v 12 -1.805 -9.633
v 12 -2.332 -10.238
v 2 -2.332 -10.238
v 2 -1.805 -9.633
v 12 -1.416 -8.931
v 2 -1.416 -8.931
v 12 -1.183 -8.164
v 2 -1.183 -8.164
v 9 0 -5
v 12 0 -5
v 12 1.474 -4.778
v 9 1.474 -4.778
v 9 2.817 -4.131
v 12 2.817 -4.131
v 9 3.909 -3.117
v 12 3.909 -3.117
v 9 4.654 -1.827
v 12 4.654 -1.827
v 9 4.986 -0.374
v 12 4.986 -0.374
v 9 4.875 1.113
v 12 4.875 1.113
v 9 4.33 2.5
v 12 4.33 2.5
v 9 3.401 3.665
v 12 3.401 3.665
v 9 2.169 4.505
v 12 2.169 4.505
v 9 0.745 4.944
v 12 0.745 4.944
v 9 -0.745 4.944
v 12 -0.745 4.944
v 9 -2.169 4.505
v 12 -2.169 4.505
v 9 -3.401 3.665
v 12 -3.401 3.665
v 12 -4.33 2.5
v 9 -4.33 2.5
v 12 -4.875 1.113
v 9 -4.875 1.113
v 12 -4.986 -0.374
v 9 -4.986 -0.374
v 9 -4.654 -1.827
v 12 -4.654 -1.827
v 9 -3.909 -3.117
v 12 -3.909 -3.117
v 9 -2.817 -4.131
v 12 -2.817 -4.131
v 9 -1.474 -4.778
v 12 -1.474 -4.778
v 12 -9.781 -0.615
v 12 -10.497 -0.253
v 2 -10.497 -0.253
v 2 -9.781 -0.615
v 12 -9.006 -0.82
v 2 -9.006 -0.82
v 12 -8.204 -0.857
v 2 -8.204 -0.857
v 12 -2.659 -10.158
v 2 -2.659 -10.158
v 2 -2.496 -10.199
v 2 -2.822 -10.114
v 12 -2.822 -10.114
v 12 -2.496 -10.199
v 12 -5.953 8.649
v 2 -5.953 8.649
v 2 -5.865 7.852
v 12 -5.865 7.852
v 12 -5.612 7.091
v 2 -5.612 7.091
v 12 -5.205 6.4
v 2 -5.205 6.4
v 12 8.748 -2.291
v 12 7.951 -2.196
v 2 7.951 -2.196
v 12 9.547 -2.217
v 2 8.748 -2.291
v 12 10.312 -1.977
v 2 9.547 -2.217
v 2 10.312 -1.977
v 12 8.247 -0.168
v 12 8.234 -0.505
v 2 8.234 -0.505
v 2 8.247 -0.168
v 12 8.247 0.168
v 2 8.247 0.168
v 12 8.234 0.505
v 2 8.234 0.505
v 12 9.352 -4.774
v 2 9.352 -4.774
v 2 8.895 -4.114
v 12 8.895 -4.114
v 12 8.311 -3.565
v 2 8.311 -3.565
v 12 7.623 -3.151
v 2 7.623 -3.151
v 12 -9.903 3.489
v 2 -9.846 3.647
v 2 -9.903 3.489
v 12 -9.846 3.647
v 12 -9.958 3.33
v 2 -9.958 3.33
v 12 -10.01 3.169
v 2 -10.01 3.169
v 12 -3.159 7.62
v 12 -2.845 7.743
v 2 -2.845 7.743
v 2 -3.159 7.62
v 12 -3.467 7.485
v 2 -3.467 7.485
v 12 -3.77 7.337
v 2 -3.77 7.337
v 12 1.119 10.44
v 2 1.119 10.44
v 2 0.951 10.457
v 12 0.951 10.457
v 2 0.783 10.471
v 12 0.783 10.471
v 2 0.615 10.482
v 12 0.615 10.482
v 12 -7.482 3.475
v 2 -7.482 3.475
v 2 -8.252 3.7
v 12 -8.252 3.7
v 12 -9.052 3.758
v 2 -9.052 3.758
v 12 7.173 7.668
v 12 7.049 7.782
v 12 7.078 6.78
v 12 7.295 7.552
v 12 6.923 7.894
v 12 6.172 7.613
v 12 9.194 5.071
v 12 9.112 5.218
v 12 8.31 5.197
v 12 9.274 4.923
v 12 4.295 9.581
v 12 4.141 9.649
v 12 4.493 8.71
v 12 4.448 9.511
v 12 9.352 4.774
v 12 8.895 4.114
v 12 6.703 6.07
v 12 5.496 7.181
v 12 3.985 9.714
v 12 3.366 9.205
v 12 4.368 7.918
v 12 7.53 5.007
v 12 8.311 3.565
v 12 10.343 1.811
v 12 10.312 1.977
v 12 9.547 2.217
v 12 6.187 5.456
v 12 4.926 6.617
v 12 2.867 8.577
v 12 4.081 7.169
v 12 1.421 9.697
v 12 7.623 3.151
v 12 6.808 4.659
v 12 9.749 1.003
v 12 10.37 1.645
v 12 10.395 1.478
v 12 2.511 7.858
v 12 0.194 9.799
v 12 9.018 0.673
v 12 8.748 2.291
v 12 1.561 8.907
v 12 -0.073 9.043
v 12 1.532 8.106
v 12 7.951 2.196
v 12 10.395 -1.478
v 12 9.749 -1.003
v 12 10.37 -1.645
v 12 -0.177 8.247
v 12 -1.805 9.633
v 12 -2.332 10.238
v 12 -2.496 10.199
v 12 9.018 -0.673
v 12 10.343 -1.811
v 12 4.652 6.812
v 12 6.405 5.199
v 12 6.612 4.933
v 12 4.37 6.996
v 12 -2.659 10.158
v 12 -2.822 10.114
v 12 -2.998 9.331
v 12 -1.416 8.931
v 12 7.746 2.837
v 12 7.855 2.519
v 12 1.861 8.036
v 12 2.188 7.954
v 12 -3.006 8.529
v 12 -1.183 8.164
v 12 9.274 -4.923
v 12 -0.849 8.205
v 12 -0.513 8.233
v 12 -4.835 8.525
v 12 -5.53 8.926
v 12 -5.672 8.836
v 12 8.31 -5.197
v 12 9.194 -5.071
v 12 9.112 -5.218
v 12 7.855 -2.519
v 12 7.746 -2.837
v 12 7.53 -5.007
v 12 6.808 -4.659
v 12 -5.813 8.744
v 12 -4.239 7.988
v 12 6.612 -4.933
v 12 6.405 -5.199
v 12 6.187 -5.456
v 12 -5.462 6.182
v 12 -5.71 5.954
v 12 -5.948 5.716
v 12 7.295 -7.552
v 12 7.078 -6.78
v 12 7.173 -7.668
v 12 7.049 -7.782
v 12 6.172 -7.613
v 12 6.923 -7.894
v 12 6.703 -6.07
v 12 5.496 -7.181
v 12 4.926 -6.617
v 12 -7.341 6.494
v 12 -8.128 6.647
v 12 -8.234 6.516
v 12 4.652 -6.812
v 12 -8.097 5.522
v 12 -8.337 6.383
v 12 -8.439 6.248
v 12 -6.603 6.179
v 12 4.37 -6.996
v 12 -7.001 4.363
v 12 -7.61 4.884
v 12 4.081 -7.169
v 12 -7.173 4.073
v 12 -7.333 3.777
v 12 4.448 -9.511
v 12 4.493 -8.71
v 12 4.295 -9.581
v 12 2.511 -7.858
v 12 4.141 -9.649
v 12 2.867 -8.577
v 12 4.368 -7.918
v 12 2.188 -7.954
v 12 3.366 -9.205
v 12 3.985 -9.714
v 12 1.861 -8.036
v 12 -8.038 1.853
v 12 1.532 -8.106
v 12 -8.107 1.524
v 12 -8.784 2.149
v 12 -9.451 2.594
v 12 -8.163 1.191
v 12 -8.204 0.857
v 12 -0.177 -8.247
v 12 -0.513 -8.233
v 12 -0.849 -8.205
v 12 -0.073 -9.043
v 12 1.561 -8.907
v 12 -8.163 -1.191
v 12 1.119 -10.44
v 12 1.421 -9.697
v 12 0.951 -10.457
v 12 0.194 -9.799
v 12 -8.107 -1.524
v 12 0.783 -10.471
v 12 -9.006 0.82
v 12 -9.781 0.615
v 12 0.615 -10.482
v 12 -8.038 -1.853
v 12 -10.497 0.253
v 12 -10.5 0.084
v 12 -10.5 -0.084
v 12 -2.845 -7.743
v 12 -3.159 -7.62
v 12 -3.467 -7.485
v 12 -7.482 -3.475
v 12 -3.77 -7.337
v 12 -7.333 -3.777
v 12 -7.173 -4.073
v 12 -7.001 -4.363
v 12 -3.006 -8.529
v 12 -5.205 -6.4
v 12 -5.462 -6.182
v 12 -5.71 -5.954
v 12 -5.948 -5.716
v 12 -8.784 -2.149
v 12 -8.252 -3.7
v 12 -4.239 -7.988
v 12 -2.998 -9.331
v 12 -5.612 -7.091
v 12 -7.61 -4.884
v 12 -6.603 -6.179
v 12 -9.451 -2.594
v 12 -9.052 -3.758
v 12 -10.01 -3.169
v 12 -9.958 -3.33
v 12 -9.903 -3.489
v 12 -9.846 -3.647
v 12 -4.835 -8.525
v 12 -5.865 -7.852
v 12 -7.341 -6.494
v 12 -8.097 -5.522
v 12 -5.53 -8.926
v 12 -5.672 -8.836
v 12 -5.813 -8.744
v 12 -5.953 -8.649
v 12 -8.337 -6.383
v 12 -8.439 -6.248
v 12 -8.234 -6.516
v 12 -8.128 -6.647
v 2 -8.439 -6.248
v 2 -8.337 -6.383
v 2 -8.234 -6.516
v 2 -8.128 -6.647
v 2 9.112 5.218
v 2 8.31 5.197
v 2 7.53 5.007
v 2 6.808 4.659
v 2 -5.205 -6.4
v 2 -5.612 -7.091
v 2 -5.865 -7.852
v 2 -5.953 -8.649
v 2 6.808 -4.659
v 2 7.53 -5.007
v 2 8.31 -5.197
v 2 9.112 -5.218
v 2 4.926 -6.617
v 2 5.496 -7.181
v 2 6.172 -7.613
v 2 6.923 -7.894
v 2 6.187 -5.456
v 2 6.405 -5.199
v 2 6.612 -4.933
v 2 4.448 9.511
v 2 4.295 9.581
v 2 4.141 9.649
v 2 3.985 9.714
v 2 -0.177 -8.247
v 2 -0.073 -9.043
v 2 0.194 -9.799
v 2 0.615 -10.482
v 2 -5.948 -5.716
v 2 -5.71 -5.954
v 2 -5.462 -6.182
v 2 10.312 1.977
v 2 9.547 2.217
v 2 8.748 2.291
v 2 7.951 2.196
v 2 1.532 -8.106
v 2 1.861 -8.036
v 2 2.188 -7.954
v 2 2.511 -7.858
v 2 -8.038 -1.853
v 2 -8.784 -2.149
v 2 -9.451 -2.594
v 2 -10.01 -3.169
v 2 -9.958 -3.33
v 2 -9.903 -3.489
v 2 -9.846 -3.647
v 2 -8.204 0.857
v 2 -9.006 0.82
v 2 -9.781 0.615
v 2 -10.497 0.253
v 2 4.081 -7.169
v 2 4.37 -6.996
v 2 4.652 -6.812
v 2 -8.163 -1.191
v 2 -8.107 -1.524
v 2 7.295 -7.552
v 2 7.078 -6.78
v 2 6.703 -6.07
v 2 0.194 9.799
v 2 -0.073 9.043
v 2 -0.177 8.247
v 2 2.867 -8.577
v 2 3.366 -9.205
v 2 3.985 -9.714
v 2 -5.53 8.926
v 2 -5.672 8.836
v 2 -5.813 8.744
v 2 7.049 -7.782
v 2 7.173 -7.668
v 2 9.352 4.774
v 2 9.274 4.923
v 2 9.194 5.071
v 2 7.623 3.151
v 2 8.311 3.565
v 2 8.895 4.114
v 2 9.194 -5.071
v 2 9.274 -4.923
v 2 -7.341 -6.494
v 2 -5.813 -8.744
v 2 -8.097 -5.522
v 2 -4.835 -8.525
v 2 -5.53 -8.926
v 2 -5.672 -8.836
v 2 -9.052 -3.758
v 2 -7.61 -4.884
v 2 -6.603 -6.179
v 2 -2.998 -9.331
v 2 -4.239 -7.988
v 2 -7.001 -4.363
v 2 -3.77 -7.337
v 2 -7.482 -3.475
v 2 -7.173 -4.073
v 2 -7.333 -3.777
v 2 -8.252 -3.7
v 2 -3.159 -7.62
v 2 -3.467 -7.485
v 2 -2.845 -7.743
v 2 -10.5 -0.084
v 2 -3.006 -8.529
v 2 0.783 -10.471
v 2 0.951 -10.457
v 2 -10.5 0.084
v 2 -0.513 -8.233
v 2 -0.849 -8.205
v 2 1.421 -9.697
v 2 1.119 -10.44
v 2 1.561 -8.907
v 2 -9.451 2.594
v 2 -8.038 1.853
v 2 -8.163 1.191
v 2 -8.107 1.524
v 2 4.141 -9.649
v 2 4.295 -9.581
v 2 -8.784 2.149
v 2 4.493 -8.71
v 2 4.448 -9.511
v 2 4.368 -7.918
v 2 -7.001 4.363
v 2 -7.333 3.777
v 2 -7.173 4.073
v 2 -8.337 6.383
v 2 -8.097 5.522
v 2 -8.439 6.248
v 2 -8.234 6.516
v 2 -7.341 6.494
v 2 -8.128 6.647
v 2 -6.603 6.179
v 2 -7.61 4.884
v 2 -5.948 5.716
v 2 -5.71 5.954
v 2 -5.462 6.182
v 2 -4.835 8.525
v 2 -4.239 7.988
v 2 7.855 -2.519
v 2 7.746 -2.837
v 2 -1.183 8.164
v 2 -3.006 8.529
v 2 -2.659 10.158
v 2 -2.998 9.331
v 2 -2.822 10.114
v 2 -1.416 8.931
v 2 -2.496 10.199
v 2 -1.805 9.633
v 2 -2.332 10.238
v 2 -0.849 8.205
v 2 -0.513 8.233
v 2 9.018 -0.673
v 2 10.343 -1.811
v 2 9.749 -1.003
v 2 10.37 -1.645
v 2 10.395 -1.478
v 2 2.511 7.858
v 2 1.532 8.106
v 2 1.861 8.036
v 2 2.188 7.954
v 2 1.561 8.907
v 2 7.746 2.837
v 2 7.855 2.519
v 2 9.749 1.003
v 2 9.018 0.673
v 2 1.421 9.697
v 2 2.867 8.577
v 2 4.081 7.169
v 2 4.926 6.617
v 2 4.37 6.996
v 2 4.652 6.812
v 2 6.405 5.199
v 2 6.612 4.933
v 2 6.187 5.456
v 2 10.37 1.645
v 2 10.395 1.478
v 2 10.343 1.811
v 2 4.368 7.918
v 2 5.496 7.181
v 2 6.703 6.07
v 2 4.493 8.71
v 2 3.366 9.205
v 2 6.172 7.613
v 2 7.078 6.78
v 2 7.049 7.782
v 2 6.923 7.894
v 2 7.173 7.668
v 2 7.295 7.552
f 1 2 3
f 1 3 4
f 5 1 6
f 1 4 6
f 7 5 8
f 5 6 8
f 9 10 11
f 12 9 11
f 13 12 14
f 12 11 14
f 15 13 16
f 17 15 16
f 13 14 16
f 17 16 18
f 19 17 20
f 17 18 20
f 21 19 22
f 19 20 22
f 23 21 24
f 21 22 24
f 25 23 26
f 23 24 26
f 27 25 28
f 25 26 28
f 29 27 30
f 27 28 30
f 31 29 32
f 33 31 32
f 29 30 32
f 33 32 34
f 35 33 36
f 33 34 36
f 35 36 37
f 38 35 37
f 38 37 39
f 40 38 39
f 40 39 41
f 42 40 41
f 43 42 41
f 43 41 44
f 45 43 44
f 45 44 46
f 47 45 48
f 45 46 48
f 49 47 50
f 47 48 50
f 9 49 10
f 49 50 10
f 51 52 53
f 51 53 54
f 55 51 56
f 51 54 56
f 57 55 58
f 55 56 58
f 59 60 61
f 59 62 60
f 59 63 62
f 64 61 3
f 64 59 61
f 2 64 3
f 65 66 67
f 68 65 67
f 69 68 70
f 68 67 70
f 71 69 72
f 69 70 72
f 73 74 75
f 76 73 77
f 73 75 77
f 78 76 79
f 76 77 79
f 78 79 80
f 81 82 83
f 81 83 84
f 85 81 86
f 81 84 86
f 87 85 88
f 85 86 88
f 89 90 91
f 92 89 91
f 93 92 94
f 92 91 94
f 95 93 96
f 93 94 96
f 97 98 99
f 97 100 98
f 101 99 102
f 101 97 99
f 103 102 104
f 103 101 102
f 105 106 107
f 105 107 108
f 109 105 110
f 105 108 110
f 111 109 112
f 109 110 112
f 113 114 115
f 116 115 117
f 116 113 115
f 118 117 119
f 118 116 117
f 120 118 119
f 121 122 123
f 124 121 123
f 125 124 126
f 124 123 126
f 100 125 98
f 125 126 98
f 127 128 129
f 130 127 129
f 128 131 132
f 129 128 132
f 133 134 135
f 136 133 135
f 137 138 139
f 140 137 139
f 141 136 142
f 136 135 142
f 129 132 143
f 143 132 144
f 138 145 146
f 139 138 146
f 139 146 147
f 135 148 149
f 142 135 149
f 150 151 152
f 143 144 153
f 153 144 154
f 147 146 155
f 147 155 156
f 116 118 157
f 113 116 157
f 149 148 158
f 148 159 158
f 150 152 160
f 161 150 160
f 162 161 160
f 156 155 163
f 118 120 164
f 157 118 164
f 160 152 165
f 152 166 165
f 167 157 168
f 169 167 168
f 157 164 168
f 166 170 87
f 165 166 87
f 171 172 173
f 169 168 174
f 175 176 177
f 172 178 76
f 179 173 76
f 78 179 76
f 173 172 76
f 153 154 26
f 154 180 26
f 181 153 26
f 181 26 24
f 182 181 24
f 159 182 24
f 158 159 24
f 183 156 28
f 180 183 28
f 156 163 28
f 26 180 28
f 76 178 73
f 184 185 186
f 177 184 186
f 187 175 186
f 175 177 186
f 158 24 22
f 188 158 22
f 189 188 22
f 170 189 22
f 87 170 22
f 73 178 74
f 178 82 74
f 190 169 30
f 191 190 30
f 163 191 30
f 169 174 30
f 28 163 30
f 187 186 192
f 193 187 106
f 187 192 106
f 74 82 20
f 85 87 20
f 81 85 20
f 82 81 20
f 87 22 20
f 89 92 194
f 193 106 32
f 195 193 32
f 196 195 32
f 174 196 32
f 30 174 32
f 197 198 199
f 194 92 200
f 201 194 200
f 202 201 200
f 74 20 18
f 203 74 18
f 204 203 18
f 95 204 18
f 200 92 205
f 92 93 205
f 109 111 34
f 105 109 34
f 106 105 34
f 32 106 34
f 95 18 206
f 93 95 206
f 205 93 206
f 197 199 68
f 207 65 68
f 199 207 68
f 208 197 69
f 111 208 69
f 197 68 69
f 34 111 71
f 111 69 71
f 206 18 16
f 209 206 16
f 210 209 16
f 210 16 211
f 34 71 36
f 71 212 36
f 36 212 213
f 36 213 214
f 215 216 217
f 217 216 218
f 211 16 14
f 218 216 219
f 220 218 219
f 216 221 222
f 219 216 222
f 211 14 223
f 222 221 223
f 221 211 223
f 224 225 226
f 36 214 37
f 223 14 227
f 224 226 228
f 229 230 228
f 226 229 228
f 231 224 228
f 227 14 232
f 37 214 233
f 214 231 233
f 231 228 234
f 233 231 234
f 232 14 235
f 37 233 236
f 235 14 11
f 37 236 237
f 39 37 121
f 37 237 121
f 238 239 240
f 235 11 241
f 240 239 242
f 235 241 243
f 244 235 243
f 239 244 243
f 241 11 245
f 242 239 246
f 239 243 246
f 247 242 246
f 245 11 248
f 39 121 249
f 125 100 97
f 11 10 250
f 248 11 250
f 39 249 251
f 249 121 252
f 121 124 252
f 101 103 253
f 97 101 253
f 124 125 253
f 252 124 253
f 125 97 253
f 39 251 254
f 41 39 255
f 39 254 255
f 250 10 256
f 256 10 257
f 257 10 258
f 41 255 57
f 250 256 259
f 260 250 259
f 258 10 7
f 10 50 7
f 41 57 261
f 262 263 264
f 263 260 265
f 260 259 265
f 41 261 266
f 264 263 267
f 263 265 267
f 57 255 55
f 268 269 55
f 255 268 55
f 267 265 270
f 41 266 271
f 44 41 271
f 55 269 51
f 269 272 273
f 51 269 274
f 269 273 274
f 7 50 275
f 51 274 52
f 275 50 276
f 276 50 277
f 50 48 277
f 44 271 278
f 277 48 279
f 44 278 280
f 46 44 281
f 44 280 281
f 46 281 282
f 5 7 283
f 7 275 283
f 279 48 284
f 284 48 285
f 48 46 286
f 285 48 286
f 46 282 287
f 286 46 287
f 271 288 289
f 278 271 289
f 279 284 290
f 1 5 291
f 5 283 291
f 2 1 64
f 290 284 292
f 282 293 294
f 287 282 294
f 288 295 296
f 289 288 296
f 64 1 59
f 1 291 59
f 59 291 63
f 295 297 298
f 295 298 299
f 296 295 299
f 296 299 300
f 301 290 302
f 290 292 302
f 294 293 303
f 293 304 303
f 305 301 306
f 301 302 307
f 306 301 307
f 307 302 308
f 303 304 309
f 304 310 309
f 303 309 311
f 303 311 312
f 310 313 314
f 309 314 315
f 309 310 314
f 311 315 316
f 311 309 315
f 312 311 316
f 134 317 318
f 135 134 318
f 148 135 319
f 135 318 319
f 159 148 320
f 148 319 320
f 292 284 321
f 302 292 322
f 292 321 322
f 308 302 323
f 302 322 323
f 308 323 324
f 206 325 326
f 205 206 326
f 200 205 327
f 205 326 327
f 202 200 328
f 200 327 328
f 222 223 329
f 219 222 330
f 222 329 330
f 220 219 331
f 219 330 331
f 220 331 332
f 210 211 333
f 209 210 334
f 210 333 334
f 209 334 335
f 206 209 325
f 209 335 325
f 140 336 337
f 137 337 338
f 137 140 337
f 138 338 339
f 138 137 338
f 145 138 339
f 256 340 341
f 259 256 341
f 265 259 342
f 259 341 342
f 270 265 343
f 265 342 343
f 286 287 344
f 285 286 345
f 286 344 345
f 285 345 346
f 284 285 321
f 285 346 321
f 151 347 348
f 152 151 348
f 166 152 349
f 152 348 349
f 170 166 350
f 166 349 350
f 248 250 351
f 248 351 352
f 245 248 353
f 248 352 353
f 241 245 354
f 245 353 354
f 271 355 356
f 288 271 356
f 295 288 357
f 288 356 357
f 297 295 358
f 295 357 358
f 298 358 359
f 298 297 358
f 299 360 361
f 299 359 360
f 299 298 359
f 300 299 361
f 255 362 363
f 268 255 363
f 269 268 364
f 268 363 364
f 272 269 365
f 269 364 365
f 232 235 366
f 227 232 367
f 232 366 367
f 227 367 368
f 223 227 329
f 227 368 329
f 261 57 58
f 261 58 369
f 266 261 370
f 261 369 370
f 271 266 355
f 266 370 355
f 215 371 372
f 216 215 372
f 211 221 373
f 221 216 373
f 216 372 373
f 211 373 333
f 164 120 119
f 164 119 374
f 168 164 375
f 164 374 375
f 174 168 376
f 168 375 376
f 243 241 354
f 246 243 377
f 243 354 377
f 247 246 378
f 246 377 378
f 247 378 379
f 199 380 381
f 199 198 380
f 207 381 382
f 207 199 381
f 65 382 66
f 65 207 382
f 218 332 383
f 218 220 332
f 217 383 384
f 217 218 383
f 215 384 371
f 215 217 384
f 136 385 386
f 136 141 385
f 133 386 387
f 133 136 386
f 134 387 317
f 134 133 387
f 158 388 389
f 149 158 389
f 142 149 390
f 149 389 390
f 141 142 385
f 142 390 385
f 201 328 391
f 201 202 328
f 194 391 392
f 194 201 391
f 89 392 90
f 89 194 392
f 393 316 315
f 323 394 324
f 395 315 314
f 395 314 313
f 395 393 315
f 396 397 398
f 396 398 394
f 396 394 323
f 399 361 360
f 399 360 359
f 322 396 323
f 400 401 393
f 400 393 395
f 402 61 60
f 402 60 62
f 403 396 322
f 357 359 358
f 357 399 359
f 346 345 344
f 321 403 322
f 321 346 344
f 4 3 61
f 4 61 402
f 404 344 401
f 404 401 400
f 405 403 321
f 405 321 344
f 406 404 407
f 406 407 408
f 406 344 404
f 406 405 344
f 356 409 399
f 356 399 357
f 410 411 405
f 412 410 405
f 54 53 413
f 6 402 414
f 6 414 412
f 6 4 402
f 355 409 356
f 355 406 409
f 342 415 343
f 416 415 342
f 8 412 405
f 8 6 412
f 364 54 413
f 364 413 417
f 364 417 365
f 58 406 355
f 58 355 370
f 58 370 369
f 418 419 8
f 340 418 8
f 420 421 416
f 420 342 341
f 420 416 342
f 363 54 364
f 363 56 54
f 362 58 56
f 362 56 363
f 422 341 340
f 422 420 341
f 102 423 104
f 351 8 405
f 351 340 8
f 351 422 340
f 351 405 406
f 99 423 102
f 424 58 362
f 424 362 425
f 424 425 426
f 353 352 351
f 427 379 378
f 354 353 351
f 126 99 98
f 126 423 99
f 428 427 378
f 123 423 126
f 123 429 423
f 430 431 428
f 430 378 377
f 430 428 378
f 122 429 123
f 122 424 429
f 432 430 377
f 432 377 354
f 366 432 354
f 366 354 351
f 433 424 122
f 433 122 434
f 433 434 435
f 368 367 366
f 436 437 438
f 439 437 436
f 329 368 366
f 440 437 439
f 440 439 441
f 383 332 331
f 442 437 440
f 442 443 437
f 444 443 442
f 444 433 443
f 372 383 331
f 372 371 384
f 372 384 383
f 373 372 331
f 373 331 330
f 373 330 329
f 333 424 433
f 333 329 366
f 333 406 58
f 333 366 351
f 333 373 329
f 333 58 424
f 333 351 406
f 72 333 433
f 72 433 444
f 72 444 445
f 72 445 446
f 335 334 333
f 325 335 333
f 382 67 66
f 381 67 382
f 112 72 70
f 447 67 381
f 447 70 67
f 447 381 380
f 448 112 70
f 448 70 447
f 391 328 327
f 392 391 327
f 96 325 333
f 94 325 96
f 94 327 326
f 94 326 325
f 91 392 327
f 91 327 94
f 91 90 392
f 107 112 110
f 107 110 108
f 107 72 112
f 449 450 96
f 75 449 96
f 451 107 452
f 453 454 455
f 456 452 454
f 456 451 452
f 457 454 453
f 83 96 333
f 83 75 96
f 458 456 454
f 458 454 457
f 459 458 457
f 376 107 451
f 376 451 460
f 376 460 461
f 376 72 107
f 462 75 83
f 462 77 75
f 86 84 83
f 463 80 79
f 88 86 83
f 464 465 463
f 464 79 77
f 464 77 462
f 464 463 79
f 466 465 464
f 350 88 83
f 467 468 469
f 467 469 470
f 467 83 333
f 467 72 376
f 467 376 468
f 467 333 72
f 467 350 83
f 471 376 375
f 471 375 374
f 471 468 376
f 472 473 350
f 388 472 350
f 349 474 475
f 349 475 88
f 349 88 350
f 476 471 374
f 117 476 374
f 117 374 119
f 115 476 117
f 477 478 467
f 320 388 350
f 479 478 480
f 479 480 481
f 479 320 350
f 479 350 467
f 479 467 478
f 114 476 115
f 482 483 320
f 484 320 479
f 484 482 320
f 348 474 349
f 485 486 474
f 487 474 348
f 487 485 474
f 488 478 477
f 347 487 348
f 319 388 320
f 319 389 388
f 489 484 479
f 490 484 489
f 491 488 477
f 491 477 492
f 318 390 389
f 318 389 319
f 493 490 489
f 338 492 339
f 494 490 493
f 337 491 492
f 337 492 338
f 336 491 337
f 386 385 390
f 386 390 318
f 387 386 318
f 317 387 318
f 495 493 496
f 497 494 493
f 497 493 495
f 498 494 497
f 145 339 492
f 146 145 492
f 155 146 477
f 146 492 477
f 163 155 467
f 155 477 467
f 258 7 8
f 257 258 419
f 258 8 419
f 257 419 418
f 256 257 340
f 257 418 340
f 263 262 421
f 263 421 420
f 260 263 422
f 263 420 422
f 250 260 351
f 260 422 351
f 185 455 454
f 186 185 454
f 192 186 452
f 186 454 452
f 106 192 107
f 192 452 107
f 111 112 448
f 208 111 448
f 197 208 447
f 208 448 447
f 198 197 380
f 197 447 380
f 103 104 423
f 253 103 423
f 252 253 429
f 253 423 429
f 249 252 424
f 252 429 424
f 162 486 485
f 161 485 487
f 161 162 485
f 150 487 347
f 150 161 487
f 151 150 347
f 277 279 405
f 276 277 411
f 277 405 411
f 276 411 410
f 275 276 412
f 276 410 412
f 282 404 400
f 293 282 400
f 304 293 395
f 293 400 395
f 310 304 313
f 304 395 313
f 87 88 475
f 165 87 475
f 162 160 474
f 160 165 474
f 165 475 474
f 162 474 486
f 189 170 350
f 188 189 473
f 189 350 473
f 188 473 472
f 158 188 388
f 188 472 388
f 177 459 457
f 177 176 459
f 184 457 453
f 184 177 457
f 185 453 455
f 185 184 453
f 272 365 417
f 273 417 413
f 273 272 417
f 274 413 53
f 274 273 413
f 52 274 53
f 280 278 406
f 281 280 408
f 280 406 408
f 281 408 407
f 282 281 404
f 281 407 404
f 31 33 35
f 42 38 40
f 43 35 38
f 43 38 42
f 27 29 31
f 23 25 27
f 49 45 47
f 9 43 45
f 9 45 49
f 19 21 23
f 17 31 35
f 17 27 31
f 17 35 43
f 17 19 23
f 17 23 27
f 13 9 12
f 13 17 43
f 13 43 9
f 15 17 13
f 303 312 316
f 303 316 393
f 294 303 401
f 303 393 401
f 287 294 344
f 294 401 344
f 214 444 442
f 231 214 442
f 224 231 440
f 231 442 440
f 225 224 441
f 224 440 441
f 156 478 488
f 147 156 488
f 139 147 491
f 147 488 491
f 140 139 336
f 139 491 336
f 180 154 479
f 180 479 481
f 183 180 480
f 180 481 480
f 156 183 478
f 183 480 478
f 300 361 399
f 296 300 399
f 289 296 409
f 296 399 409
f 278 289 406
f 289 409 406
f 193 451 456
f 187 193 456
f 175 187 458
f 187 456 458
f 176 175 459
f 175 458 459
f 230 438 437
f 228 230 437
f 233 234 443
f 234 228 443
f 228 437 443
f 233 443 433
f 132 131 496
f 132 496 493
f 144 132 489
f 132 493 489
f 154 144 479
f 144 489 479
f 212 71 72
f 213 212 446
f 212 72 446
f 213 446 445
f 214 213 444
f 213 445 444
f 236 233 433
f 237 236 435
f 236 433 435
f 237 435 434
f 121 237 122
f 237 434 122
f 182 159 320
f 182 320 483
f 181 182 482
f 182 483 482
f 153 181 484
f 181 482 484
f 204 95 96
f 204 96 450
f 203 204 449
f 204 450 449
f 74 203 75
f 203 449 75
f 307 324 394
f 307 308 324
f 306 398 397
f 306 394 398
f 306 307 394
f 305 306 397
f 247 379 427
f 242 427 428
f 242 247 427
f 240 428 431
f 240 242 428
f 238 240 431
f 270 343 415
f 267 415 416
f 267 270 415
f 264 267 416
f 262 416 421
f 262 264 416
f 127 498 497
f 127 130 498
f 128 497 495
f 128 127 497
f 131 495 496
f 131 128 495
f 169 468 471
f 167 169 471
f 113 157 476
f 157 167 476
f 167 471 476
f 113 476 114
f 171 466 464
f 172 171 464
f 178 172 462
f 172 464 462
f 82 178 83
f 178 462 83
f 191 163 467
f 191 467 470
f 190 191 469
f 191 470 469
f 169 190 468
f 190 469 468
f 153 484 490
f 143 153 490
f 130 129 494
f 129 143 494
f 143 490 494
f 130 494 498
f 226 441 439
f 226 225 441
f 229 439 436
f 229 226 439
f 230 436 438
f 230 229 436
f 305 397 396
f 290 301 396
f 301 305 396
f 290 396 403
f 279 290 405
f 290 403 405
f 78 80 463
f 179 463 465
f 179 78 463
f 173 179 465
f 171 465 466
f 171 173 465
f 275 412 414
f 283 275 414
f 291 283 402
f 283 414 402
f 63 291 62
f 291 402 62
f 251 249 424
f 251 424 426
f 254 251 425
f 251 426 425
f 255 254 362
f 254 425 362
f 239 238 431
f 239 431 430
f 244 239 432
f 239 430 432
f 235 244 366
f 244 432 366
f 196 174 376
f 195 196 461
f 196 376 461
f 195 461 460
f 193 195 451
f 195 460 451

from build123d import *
from build123d.topology import SkipClean

# Parameters (mm, degrees)
BASPROSKE_W         = 12
BASPROSKE_H         = 10.5
TOOTHCUT_DEPTH      = 20.091883092
TEETHCUTS_COUNT     = 19
BORSKE_R            = 2.5
BORE_DEPTH          = 50.0000508
SKETCH1_R           = 5
CUT_EXTRUDE1_DEPTH  = 3
BOSS_EXTRUDE1_DEPTH = 9
SKETCH3_R           = 10.5
SKETCH3_R_2         = 8.249
CUT_EXTRUDE2_DEPTH  = 2
SKETCH4_R           = 8.249
CUT_EXTRUDE3_DEPTH  = 2
BOSS_EXTRUDE3_START = -7
SKETCH5_R           = 2.5
BOSS_EXTRUDE3_DEPTH = 7


with BuildPart() as part:
    # BasProSke → Base-Revolve (revolve)
    with BuildSketch(Plane(origin=(0, 0, 0), x_dir=(1, 0, 0), z_dir=(0, 1, 0)), mode=Mode.PRIVATE) as base_revolve_sk:
        with Locations((6, 5.25)):
            Rectangle(BASPROSKE_W, BASPROSKE_H)
    revolve(base_revolve_sk.sketch.rotate(Axis((-10, 0, 0), (1, 0, 0)), 180), axis=Axis((-10, 0, 0), (1, 0, 0)))

    # TooCutSke → ToothCut (cut, through all)
    with BuildSketch(Plane(origin=(0, 0, 0), x_dir=(0, 0, -1), z_dir=(1, 0, 0))):
        with BuildLine():
            ThreePointArc((0.505024765, 8.233526036), (0, 8.249), (-0.505024765, 8.233526036))
            ThreePointArc((-0.505024765, 8.233526036), (-0.825185426, 9.406360648), (-1.499357972, 10.41805984))
            ThreePointArc((-1.499357972, 10.41805984), (0, 10.5254), (1.499357972, 10.41805984))
            ThreePointArc((1.499357972, 10.41805984), (0.825185426, 9.406360648), (0.505024765, 8.233526036))
        make_face()
    toothcut = extrude(amount=TOOTHCUT_DEPTH, mode=Mode.SUBTRACT)

    # TeethCuts: ToothCut ×19 about axis
    teethcuts_axis = Axis((0, 0, 0), (1, 0, 0))
    for i in range(1, TEETHCUTS_COUNT):
        add(toothcut.rotate(teethcuts_axis, i * 360 / TEETHCUTS_COUNT), mode=Mode.SUBTRACT)

    # BorSke → Bore (cut, symmetric)
    with BuildSketch(Plane(origin=(0, 0, 0), x_dir=(0, 0, -1), z_dir=(1, 0, 0))):
        with Locations(Location((0, 0, 0), (0, 0, 180))):
            Circle(BORSKE_R)
    extrude(amount=BORE_DEPTH, both=True, mode=Mode.SUBTRACT)

    # Sketch1 → Cut-Extrude1 (cut)
    with BuildSketch(Plane(origin=(12, 0, 0), x_dir=(0, 0, -1), z_dir=(1, 0, 0))):
        Circle(SKETCH1_R)
    extrude(amount=-CUT_EXTRUDE1_DEPTH, mode=Mode.SUBTRACT)

    # Sketch2 → Boss-Extrude1 (add)
    with BuildSketch(Plane(origin=(9, 0, 0), x_dir=(0, 0, -1), z_dir=(1, 0, 0))):
        with BuildLine():
            Line((-2.085372664, -1.378847653), (-2.085372664, 1.378847653))
            ThreePointArc((-2.085372664, 1.378847653), (-2.5, 0), (-2.085372664, -1.378847653))
        make_face()
    extrude(amount=-BOSS_EXTRUDE1_DEPTH)

    # Sketch3 → Cut-Extrude2 (cut)
    with SkipClean():  # the faces are left unmerged after this step: merging them gives an invalid solid
        with BuildSketch(Plane.ZY):
            Circle(SKETCH3_R)
            with Locations(Location((0, 0, 0), (0, 0, 358.773146294))):
                Circle(SKETCH3_R_2, mode=Mode.SUBTRACT)
        extrude(amount=-CUT_EXTRUDE2_DEPTH, mode=Mode.SUBTRACT)

    # Sketch4 → Cut-Extrude3 (cut)
    with BuildSketch(Plane.ZY):
        Circle(SKETCH4_R)
    extrude(amount=-CUT_EXTRUDE3_DEPTH, mode=Mode.SUBTRACT)

    # Sketch5 → Boss-Extrude3 (add)
    with BuildSketch(Plane.ZY.offset(-2).offset(BOSS_EXTRUDE3_START)):
        Circle(SKETCH5_R)
    extrude(amount=BOSS_EXTRUDE3_DEPTH)


solid = part.part
